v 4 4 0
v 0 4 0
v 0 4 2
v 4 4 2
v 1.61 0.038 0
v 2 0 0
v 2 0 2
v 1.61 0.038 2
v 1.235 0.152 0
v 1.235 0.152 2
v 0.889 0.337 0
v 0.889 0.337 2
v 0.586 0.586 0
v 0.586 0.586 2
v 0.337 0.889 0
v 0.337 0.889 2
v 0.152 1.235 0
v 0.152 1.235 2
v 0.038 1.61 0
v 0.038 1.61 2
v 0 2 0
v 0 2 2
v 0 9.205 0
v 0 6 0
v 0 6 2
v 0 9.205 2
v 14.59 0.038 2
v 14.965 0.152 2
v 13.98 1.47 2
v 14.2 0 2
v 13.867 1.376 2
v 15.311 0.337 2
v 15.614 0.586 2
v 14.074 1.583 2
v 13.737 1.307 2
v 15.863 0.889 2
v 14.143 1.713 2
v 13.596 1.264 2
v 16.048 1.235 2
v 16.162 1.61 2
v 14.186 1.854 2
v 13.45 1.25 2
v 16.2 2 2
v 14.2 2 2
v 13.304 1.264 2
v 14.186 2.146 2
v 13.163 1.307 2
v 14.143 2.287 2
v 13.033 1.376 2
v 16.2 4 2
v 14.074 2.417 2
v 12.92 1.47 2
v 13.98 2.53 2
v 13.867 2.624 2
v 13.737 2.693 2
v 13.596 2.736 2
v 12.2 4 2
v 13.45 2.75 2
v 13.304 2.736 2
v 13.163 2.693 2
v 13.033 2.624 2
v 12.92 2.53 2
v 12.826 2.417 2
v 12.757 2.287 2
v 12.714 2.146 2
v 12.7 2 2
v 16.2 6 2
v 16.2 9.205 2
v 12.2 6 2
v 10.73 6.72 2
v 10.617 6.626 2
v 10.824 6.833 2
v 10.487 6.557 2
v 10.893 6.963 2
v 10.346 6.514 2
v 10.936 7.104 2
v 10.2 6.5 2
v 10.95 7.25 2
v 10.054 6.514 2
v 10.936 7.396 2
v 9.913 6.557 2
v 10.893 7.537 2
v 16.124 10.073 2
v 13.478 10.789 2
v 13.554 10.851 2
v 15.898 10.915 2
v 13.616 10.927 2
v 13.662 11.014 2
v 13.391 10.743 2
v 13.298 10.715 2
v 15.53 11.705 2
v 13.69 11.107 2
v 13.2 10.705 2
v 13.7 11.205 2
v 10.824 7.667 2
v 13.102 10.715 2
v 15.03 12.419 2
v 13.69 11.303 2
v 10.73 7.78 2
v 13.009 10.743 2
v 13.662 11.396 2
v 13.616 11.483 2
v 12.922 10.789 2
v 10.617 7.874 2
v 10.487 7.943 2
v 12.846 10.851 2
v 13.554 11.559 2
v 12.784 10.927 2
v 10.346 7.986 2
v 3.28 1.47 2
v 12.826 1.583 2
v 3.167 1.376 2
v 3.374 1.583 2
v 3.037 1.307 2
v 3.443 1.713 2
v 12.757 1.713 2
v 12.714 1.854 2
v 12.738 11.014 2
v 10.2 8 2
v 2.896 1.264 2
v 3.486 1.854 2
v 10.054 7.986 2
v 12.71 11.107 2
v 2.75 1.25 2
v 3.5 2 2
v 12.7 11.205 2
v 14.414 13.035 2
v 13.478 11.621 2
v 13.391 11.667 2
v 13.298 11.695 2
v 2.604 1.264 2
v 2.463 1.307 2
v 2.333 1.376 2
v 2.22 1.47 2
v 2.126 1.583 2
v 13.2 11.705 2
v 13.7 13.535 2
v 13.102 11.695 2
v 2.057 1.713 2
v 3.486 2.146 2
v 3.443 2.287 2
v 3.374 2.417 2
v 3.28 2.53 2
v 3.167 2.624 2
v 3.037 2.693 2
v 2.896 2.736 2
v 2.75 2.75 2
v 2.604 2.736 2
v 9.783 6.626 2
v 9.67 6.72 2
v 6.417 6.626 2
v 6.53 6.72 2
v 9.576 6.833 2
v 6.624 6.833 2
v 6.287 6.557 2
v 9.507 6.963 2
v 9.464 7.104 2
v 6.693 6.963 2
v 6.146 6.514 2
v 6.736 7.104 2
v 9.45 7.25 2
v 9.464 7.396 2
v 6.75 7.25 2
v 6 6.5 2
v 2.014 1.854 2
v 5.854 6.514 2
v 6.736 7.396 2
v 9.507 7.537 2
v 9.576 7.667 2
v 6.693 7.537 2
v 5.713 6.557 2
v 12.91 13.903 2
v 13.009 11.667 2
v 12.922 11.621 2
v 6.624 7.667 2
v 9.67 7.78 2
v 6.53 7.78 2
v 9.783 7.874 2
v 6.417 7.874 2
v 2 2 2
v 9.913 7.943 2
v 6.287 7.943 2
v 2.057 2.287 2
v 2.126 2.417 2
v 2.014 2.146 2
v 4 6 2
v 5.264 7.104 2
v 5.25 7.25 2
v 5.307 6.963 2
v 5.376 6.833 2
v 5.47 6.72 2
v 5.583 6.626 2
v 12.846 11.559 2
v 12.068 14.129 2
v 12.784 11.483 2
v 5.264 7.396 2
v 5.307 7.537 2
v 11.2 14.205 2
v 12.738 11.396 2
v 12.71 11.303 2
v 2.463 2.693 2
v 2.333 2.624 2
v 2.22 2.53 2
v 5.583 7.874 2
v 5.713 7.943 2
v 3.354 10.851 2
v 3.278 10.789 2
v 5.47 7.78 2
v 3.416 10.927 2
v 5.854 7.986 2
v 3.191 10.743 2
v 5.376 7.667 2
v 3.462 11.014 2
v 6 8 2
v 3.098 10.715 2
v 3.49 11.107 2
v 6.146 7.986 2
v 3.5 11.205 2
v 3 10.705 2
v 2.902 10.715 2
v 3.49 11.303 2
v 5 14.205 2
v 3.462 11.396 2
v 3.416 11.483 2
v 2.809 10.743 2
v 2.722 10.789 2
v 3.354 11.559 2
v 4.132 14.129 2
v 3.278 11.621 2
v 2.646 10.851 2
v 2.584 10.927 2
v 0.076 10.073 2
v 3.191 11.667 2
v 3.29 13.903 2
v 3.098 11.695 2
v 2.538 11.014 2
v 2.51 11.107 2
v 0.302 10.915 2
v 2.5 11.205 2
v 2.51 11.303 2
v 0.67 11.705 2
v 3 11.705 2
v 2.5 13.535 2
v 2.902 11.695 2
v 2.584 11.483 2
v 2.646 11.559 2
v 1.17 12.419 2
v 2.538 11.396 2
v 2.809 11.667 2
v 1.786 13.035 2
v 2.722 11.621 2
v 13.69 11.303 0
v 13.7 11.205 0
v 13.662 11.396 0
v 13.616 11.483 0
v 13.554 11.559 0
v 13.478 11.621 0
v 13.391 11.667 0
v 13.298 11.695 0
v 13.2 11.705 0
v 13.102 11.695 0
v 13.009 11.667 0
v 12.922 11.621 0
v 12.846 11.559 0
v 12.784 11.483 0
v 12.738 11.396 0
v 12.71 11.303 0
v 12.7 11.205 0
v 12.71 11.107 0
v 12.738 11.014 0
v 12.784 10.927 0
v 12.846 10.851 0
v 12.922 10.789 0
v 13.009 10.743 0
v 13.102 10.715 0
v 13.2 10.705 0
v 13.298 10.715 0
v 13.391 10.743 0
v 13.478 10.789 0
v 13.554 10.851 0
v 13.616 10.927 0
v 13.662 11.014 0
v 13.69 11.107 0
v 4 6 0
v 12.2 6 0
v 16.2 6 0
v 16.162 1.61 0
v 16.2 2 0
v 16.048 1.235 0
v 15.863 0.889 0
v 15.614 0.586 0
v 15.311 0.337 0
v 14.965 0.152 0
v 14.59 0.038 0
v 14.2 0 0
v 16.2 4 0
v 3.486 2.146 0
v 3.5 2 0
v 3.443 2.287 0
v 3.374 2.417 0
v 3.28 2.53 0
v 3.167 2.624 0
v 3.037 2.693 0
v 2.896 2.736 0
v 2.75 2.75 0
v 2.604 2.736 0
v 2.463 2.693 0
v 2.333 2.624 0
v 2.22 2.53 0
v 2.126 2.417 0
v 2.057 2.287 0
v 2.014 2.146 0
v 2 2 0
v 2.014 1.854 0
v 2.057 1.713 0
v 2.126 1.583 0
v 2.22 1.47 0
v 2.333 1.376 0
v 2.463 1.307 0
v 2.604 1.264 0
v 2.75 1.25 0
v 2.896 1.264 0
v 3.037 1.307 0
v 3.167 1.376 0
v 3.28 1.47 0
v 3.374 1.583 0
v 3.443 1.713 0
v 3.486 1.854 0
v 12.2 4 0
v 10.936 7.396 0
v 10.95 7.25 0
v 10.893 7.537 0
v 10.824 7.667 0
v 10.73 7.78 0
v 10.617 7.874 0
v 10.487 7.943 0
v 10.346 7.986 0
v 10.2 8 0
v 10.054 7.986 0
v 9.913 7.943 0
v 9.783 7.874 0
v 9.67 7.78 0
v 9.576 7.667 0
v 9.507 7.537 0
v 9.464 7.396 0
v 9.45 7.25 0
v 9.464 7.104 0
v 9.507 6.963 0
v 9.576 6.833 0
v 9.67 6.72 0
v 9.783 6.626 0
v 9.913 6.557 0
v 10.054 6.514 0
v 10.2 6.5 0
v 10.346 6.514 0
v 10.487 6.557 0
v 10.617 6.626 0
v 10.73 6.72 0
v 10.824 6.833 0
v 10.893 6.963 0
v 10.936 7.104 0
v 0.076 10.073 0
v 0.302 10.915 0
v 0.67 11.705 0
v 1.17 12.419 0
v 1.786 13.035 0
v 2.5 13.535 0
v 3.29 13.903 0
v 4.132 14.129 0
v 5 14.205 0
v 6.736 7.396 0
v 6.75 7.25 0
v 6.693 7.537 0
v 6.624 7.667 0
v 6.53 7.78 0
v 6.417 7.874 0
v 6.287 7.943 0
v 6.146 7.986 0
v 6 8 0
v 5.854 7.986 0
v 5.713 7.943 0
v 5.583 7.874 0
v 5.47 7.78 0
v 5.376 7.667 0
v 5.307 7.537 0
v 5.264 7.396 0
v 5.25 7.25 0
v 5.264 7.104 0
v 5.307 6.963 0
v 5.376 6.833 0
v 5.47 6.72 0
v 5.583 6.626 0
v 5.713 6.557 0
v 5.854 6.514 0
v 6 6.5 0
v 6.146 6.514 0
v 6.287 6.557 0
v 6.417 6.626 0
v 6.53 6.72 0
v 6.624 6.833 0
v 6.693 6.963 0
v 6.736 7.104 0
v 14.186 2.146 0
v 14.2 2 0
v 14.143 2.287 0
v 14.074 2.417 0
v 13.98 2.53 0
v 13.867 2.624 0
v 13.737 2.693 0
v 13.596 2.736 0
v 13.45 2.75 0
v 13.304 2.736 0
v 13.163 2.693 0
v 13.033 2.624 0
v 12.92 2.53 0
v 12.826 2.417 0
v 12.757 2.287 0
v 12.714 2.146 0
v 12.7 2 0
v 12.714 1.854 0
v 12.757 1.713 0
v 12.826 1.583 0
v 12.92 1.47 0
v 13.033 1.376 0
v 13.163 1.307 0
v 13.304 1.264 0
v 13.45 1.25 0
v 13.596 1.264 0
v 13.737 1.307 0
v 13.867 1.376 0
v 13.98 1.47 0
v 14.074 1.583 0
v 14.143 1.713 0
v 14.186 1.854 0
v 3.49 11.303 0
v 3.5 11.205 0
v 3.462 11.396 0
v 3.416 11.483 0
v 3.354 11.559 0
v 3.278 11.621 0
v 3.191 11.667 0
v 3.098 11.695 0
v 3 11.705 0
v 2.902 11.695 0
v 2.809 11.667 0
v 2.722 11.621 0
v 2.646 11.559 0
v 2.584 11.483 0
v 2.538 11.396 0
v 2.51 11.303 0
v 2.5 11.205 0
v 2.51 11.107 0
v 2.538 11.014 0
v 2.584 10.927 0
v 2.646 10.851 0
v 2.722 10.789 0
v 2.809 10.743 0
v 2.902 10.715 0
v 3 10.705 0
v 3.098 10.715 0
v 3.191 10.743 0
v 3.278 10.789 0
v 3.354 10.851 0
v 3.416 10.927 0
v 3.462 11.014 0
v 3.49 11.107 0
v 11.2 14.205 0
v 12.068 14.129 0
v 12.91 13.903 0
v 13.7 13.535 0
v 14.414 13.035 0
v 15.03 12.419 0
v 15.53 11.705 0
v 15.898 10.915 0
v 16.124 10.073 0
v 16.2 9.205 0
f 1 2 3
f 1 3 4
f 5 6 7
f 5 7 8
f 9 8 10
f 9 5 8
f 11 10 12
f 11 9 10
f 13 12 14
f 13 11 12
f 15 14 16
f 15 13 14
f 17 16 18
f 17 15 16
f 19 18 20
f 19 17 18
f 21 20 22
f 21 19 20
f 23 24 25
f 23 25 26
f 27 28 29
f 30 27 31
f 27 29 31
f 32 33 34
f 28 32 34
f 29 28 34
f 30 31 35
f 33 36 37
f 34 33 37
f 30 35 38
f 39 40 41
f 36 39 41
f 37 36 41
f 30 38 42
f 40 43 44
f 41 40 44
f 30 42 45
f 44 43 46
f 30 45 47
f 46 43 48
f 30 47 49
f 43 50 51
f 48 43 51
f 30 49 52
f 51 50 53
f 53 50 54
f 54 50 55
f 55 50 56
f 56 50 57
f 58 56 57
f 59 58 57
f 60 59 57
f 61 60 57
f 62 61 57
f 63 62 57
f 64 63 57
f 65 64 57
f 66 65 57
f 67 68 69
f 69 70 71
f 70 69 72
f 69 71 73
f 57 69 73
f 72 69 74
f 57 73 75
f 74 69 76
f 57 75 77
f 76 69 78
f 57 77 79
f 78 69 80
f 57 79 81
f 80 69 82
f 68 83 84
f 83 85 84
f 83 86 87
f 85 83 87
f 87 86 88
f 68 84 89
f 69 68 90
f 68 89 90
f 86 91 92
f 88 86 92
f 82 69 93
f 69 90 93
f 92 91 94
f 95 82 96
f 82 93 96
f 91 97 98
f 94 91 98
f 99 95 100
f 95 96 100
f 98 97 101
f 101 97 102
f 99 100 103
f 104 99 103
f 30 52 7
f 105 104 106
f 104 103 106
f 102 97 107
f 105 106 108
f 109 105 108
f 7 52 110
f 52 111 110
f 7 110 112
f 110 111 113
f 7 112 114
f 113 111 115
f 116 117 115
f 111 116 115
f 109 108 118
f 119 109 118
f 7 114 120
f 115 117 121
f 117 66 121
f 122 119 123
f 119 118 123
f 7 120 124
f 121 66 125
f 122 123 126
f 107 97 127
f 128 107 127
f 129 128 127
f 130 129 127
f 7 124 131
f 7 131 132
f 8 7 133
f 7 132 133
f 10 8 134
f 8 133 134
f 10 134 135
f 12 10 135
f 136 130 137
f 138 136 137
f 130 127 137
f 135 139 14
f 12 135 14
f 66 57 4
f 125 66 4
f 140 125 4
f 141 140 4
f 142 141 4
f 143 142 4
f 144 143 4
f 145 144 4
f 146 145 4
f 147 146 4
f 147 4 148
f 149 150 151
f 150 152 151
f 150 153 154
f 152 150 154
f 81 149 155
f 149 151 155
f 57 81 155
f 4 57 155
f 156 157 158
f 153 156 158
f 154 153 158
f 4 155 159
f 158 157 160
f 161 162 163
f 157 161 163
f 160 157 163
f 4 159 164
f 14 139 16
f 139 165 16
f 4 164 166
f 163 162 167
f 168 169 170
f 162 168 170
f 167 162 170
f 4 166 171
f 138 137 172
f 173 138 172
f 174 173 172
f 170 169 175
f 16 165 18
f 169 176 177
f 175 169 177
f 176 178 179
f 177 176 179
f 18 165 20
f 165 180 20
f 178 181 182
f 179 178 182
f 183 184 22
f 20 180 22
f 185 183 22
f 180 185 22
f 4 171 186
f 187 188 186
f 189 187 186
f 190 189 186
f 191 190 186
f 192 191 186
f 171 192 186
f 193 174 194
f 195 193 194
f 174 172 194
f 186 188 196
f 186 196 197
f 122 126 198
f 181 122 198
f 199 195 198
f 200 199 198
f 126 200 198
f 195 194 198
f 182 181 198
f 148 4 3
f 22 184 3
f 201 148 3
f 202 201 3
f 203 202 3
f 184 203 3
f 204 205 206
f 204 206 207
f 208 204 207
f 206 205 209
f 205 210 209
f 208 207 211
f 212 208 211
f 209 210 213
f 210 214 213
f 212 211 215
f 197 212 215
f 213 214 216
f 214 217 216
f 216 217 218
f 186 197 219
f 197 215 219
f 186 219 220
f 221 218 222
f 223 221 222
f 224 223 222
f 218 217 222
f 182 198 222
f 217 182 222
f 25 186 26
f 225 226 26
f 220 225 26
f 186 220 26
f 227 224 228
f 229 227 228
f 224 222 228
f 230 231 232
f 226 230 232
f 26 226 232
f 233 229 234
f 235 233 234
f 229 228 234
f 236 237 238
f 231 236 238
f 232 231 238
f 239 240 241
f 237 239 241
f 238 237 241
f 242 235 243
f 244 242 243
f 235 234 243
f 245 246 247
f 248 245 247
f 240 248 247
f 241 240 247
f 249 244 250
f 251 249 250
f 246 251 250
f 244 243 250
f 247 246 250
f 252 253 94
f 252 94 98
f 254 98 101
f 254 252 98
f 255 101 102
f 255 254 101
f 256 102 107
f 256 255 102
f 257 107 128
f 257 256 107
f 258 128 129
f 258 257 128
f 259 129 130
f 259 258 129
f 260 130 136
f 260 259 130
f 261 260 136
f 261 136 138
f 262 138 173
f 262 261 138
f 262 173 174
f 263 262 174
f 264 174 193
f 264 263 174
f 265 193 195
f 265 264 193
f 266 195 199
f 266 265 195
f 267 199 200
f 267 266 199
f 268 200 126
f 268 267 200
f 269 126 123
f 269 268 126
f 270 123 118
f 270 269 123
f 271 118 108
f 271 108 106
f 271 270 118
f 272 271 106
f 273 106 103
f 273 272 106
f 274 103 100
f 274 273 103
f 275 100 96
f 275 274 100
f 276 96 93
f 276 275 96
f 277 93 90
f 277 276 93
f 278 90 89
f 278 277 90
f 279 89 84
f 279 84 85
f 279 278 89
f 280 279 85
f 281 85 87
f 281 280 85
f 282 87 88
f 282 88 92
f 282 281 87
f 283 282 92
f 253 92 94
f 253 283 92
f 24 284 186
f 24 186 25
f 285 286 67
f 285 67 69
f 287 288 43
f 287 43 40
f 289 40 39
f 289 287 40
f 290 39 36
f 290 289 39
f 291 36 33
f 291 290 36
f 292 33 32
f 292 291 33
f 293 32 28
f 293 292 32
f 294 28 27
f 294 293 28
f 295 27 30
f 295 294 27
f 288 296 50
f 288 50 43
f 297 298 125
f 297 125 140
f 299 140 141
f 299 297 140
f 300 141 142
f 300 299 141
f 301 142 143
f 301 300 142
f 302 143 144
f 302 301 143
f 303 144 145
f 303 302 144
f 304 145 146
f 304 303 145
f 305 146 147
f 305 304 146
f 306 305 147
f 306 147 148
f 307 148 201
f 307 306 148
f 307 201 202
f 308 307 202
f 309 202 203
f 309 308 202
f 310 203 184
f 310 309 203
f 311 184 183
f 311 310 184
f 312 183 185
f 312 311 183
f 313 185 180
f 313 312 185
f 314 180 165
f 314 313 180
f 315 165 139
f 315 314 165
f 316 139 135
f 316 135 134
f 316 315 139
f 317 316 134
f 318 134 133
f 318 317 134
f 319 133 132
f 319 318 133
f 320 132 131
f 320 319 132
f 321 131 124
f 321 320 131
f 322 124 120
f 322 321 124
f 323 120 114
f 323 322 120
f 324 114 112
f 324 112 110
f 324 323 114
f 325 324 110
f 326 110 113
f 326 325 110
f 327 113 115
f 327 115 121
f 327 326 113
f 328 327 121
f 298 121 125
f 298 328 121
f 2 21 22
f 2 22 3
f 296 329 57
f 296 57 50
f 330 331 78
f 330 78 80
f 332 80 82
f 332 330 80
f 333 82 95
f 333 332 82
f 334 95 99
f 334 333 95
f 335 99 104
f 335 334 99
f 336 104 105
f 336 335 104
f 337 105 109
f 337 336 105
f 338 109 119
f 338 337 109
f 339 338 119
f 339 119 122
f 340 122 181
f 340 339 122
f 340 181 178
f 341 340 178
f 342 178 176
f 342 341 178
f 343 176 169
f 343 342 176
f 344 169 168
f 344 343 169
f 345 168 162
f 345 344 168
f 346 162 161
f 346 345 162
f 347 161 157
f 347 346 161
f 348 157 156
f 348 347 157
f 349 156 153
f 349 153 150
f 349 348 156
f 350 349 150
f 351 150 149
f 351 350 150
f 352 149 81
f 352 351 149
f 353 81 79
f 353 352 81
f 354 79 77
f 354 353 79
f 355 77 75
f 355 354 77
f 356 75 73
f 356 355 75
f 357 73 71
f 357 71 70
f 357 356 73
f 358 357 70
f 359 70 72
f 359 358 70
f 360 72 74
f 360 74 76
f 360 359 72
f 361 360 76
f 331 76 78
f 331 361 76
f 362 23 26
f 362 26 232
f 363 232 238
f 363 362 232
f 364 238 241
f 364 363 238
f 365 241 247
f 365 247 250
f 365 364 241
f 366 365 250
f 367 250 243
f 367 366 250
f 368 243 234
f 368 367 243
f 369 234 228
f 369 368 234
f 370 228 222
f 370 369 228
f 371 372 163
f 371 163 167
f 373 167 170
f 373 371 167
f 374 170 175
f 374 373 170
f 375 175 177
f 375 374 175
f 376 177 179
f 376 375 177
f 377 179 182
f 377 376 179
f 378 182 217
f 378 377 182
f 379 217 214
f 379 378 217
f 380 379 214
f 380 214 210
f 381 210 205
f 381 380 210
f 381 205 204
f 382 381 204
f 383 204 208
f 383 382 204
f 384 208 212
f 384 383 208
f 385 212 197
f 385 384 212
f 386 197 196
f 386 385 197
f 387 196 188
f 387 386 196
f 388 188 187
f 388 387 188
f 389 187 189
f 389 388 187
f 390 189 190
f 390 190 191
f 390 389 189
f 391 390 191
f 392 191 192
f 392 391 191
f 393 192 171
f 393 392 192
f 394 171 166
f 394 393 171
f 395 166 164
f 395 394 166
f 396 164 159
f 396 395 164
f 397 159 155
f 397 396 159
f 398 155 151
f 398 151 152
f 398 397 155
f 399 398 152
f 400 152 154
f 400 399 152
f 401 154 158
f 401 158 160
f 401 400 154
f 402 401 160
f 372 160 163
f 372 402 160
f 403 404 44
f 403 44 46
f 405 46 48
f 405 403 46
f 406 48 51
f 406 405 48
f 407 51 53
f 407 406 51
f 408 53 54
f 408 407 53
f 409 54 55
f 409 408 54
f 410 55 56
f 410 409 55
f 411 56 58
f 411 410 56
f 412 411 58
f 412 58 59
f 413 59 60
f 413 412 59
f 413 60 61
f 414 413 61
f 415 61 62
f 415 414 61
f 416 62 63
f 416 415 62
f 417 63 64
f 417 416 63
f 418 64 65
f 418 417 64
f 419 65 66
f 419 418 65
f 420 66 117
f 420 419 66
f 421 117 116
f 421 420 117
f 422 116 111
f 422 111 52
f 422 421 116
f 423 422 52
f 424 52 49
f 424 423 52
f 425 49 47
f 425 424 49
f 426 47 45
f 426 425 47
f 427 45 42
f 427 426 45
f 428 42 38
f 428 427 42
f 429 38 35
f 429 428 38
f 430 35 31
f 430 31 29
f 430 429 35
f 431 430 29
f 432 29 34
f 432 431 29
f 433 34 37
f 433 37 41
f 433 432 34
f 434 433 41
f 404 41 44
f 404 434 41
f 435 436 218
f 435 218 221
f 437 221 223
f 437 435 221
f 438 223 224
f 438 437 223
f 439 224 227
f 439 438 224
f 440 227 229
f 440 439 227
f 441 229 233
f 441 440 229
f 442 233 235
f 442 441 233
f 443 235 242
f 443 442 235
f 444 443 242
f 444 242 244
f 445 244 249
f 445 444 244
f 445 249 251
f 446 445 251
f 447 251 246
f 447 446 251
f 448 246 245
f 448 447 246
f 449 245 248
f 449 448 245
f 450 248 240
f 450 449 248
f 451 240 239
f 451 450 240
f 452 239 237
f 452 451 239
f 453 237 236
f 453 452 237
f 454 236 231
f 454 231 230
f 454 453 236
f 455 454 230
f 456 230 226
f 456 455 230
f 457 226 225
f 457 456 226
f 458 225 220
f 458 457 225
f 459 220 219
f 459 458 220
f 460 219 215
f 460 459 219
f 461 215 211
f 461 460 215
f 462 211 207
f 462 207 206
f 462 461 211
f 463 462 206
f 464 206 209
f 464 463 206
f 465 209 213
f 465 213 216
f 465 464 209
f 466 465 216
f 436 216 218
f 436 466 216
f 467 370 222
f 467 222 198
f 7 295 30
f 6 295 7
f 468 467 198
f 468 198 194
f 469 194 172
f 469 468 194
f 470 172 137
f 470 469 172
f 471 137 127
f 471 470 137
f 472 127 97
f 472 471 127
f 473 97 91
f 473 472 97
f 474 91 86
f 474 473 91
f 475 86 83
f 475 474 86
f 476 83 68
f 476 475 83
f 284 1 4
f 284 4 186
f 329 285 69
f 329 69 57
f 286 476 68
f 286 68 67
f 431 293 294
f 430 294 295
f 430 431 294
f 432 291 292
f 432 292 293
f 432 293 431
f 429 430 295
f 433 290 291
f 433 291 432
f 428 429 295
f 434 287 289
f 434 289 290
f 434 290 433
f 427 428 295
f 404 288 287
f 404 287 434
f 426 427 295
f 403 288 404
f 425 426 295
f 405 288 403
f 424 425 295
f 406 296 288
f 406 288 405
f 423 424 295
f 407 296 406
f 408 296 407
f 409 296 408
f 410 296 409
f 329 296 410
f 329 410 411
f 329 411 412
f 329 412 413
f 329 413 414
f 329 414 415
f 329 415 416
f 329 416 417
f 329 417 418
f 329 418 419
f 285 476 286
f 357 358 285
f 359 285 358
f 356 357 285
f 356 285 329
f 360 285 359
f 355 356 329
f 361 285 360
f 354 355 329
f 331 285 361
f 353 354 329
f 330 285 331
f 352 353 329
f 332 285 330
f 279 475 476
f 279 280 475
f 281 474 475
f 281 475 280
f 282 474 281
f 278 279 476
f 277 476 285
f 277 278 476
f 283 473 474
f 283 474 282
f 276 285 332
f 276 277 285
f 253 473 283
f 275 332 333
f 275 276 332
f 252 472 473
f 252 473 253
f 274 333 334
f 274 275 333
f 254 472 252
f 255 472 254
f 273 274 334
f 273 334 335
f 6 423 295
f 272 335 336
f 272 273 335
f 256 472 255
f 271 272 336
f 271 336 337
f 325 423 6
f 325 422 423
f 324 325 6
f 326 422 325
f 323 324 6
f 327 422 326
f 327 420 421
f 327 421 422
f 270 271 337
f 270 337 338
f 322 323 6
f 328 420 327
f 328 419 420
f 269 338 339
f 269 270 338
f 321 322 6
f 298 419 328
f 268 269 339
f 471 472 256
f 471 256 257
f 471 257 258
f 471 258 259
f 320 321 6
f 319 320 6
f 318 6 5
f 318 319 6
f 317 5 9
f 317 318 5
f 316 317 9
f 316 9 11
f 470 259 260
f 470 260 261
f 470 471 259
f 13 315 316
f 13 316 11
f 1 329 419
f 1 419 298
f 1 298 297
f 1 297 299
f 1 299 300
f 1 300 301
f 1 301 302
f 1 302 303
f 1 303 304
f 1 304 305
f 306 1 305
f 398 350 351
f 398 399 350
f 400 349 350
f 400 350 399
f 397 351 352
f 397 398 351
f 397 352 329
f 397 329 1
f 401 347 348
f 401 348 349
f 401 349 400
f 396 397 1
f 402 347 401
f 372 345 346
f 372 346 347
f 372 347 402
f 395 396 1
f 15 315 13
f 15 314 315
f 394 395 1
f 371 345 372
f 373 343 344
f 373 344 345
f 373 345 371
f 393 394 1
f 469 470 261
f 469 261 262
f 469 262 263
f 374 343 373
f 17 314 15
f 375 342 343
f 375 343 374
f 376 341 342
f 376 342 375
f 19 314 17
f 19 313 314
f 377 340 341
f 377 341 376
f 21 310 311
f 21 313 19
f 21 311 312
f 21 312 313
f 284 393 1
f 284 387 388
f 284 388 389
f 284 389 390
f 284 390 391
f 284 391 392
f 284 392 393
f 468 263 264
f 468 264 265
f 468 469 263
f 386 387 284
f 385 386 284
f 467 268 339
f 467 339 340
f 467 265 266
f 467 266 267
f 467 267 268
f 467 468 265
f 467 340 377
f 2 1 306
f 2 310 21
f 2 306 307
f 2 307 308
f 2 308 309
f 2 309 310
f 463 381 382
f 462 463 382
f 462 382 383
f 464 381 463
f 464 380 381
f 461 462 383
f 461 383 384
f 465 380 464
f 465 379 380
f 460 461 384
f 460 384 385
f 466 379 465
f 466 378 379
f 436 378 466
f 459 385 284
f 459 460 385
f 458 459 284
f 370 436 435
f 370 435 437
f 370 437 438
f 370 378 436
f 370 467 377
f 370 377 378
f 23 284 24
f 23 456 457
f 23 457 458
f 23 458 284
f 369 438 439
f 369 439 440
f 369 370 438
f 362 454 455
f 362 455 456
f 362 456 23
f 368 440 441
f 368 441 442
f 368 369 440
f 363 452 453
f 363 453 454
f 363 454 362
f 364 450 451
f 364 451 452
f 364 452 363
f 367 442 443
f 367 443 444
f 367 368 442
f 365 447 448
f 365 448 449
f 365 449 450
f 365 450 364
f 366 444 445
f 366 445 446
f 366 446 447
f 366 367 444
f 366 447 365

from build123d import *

# Parameters (mm, degrees)
SKETCH1_R           = 0.75
SKETCH1_R_2         = 0.5
BOSS_EXTRUDE1_DEPTH = 2


with BuildPart() as part:
    # Sketch1 → Boss-Extrude1 (new body)
    with BuildSketch(Plane.XY):
        with BuildLine():
            Line((12.2, 4), (16.2, 4))
            Line((16.2, 4), (16.2, 2))
            ThreePointArc((16.2, 2), (15.614213562, 0.585786438), (14.2, 0))
            Line((14.2, 0), (2, 0))
            ThreePointArc((2, 0), (0.585786438, 0.585786438), (0, 2))
            Line((0, 2), (0, 4))
            Line((0, 4), (4, 4))
            Line((4, 4), (4, 6))
            Line((4, 6), (0, 6))
            Line((0, 6), (0, 9.205))
            ThreePointArc((0, 9.205), (1.464466094, 12.740533906), (5, 14.205))
            Line((5, 14.205), (11.2, 14.205))
            ThreePointArc((11.2, 14.205), (14.735533906, 12.740533906), (16.2, 9.205))
            Line((16.2, 9.205), (16.2, 6))
            Line((16.2, 6), (12.2, 6))
            Line((12.2, 6), (12.2, 4))
        make_face()
        with Locations((13.45, 2)):
            Circle(SKETCH1_R, mode=Mode.SUBTRACT)
        with Locations((13.2, 11.205)):
            Circle(SKETCH1_R_2, mode=Mode.SUBTRACT)
        with Locations((10.2, 7.25)):
            Circle(SKETCH1_R, mode=Mode.SUBTRACT)
        with Locations((6, 7.25)):
            Circle(SKETCH1_R, mode=Mode.SUBTRACT)
        with Locations((3, 11.205)):
            Circle(SKETCH1_R_2, mode=Mode.SUBTRACT)
        with Locations((2.75, 2)):
            Circle(SKETCH1_R, mode=Mode.SUBTRACT)
    extrude(amount=BOSS_EXTRUDE1_DEPTH)


solid = part.part
